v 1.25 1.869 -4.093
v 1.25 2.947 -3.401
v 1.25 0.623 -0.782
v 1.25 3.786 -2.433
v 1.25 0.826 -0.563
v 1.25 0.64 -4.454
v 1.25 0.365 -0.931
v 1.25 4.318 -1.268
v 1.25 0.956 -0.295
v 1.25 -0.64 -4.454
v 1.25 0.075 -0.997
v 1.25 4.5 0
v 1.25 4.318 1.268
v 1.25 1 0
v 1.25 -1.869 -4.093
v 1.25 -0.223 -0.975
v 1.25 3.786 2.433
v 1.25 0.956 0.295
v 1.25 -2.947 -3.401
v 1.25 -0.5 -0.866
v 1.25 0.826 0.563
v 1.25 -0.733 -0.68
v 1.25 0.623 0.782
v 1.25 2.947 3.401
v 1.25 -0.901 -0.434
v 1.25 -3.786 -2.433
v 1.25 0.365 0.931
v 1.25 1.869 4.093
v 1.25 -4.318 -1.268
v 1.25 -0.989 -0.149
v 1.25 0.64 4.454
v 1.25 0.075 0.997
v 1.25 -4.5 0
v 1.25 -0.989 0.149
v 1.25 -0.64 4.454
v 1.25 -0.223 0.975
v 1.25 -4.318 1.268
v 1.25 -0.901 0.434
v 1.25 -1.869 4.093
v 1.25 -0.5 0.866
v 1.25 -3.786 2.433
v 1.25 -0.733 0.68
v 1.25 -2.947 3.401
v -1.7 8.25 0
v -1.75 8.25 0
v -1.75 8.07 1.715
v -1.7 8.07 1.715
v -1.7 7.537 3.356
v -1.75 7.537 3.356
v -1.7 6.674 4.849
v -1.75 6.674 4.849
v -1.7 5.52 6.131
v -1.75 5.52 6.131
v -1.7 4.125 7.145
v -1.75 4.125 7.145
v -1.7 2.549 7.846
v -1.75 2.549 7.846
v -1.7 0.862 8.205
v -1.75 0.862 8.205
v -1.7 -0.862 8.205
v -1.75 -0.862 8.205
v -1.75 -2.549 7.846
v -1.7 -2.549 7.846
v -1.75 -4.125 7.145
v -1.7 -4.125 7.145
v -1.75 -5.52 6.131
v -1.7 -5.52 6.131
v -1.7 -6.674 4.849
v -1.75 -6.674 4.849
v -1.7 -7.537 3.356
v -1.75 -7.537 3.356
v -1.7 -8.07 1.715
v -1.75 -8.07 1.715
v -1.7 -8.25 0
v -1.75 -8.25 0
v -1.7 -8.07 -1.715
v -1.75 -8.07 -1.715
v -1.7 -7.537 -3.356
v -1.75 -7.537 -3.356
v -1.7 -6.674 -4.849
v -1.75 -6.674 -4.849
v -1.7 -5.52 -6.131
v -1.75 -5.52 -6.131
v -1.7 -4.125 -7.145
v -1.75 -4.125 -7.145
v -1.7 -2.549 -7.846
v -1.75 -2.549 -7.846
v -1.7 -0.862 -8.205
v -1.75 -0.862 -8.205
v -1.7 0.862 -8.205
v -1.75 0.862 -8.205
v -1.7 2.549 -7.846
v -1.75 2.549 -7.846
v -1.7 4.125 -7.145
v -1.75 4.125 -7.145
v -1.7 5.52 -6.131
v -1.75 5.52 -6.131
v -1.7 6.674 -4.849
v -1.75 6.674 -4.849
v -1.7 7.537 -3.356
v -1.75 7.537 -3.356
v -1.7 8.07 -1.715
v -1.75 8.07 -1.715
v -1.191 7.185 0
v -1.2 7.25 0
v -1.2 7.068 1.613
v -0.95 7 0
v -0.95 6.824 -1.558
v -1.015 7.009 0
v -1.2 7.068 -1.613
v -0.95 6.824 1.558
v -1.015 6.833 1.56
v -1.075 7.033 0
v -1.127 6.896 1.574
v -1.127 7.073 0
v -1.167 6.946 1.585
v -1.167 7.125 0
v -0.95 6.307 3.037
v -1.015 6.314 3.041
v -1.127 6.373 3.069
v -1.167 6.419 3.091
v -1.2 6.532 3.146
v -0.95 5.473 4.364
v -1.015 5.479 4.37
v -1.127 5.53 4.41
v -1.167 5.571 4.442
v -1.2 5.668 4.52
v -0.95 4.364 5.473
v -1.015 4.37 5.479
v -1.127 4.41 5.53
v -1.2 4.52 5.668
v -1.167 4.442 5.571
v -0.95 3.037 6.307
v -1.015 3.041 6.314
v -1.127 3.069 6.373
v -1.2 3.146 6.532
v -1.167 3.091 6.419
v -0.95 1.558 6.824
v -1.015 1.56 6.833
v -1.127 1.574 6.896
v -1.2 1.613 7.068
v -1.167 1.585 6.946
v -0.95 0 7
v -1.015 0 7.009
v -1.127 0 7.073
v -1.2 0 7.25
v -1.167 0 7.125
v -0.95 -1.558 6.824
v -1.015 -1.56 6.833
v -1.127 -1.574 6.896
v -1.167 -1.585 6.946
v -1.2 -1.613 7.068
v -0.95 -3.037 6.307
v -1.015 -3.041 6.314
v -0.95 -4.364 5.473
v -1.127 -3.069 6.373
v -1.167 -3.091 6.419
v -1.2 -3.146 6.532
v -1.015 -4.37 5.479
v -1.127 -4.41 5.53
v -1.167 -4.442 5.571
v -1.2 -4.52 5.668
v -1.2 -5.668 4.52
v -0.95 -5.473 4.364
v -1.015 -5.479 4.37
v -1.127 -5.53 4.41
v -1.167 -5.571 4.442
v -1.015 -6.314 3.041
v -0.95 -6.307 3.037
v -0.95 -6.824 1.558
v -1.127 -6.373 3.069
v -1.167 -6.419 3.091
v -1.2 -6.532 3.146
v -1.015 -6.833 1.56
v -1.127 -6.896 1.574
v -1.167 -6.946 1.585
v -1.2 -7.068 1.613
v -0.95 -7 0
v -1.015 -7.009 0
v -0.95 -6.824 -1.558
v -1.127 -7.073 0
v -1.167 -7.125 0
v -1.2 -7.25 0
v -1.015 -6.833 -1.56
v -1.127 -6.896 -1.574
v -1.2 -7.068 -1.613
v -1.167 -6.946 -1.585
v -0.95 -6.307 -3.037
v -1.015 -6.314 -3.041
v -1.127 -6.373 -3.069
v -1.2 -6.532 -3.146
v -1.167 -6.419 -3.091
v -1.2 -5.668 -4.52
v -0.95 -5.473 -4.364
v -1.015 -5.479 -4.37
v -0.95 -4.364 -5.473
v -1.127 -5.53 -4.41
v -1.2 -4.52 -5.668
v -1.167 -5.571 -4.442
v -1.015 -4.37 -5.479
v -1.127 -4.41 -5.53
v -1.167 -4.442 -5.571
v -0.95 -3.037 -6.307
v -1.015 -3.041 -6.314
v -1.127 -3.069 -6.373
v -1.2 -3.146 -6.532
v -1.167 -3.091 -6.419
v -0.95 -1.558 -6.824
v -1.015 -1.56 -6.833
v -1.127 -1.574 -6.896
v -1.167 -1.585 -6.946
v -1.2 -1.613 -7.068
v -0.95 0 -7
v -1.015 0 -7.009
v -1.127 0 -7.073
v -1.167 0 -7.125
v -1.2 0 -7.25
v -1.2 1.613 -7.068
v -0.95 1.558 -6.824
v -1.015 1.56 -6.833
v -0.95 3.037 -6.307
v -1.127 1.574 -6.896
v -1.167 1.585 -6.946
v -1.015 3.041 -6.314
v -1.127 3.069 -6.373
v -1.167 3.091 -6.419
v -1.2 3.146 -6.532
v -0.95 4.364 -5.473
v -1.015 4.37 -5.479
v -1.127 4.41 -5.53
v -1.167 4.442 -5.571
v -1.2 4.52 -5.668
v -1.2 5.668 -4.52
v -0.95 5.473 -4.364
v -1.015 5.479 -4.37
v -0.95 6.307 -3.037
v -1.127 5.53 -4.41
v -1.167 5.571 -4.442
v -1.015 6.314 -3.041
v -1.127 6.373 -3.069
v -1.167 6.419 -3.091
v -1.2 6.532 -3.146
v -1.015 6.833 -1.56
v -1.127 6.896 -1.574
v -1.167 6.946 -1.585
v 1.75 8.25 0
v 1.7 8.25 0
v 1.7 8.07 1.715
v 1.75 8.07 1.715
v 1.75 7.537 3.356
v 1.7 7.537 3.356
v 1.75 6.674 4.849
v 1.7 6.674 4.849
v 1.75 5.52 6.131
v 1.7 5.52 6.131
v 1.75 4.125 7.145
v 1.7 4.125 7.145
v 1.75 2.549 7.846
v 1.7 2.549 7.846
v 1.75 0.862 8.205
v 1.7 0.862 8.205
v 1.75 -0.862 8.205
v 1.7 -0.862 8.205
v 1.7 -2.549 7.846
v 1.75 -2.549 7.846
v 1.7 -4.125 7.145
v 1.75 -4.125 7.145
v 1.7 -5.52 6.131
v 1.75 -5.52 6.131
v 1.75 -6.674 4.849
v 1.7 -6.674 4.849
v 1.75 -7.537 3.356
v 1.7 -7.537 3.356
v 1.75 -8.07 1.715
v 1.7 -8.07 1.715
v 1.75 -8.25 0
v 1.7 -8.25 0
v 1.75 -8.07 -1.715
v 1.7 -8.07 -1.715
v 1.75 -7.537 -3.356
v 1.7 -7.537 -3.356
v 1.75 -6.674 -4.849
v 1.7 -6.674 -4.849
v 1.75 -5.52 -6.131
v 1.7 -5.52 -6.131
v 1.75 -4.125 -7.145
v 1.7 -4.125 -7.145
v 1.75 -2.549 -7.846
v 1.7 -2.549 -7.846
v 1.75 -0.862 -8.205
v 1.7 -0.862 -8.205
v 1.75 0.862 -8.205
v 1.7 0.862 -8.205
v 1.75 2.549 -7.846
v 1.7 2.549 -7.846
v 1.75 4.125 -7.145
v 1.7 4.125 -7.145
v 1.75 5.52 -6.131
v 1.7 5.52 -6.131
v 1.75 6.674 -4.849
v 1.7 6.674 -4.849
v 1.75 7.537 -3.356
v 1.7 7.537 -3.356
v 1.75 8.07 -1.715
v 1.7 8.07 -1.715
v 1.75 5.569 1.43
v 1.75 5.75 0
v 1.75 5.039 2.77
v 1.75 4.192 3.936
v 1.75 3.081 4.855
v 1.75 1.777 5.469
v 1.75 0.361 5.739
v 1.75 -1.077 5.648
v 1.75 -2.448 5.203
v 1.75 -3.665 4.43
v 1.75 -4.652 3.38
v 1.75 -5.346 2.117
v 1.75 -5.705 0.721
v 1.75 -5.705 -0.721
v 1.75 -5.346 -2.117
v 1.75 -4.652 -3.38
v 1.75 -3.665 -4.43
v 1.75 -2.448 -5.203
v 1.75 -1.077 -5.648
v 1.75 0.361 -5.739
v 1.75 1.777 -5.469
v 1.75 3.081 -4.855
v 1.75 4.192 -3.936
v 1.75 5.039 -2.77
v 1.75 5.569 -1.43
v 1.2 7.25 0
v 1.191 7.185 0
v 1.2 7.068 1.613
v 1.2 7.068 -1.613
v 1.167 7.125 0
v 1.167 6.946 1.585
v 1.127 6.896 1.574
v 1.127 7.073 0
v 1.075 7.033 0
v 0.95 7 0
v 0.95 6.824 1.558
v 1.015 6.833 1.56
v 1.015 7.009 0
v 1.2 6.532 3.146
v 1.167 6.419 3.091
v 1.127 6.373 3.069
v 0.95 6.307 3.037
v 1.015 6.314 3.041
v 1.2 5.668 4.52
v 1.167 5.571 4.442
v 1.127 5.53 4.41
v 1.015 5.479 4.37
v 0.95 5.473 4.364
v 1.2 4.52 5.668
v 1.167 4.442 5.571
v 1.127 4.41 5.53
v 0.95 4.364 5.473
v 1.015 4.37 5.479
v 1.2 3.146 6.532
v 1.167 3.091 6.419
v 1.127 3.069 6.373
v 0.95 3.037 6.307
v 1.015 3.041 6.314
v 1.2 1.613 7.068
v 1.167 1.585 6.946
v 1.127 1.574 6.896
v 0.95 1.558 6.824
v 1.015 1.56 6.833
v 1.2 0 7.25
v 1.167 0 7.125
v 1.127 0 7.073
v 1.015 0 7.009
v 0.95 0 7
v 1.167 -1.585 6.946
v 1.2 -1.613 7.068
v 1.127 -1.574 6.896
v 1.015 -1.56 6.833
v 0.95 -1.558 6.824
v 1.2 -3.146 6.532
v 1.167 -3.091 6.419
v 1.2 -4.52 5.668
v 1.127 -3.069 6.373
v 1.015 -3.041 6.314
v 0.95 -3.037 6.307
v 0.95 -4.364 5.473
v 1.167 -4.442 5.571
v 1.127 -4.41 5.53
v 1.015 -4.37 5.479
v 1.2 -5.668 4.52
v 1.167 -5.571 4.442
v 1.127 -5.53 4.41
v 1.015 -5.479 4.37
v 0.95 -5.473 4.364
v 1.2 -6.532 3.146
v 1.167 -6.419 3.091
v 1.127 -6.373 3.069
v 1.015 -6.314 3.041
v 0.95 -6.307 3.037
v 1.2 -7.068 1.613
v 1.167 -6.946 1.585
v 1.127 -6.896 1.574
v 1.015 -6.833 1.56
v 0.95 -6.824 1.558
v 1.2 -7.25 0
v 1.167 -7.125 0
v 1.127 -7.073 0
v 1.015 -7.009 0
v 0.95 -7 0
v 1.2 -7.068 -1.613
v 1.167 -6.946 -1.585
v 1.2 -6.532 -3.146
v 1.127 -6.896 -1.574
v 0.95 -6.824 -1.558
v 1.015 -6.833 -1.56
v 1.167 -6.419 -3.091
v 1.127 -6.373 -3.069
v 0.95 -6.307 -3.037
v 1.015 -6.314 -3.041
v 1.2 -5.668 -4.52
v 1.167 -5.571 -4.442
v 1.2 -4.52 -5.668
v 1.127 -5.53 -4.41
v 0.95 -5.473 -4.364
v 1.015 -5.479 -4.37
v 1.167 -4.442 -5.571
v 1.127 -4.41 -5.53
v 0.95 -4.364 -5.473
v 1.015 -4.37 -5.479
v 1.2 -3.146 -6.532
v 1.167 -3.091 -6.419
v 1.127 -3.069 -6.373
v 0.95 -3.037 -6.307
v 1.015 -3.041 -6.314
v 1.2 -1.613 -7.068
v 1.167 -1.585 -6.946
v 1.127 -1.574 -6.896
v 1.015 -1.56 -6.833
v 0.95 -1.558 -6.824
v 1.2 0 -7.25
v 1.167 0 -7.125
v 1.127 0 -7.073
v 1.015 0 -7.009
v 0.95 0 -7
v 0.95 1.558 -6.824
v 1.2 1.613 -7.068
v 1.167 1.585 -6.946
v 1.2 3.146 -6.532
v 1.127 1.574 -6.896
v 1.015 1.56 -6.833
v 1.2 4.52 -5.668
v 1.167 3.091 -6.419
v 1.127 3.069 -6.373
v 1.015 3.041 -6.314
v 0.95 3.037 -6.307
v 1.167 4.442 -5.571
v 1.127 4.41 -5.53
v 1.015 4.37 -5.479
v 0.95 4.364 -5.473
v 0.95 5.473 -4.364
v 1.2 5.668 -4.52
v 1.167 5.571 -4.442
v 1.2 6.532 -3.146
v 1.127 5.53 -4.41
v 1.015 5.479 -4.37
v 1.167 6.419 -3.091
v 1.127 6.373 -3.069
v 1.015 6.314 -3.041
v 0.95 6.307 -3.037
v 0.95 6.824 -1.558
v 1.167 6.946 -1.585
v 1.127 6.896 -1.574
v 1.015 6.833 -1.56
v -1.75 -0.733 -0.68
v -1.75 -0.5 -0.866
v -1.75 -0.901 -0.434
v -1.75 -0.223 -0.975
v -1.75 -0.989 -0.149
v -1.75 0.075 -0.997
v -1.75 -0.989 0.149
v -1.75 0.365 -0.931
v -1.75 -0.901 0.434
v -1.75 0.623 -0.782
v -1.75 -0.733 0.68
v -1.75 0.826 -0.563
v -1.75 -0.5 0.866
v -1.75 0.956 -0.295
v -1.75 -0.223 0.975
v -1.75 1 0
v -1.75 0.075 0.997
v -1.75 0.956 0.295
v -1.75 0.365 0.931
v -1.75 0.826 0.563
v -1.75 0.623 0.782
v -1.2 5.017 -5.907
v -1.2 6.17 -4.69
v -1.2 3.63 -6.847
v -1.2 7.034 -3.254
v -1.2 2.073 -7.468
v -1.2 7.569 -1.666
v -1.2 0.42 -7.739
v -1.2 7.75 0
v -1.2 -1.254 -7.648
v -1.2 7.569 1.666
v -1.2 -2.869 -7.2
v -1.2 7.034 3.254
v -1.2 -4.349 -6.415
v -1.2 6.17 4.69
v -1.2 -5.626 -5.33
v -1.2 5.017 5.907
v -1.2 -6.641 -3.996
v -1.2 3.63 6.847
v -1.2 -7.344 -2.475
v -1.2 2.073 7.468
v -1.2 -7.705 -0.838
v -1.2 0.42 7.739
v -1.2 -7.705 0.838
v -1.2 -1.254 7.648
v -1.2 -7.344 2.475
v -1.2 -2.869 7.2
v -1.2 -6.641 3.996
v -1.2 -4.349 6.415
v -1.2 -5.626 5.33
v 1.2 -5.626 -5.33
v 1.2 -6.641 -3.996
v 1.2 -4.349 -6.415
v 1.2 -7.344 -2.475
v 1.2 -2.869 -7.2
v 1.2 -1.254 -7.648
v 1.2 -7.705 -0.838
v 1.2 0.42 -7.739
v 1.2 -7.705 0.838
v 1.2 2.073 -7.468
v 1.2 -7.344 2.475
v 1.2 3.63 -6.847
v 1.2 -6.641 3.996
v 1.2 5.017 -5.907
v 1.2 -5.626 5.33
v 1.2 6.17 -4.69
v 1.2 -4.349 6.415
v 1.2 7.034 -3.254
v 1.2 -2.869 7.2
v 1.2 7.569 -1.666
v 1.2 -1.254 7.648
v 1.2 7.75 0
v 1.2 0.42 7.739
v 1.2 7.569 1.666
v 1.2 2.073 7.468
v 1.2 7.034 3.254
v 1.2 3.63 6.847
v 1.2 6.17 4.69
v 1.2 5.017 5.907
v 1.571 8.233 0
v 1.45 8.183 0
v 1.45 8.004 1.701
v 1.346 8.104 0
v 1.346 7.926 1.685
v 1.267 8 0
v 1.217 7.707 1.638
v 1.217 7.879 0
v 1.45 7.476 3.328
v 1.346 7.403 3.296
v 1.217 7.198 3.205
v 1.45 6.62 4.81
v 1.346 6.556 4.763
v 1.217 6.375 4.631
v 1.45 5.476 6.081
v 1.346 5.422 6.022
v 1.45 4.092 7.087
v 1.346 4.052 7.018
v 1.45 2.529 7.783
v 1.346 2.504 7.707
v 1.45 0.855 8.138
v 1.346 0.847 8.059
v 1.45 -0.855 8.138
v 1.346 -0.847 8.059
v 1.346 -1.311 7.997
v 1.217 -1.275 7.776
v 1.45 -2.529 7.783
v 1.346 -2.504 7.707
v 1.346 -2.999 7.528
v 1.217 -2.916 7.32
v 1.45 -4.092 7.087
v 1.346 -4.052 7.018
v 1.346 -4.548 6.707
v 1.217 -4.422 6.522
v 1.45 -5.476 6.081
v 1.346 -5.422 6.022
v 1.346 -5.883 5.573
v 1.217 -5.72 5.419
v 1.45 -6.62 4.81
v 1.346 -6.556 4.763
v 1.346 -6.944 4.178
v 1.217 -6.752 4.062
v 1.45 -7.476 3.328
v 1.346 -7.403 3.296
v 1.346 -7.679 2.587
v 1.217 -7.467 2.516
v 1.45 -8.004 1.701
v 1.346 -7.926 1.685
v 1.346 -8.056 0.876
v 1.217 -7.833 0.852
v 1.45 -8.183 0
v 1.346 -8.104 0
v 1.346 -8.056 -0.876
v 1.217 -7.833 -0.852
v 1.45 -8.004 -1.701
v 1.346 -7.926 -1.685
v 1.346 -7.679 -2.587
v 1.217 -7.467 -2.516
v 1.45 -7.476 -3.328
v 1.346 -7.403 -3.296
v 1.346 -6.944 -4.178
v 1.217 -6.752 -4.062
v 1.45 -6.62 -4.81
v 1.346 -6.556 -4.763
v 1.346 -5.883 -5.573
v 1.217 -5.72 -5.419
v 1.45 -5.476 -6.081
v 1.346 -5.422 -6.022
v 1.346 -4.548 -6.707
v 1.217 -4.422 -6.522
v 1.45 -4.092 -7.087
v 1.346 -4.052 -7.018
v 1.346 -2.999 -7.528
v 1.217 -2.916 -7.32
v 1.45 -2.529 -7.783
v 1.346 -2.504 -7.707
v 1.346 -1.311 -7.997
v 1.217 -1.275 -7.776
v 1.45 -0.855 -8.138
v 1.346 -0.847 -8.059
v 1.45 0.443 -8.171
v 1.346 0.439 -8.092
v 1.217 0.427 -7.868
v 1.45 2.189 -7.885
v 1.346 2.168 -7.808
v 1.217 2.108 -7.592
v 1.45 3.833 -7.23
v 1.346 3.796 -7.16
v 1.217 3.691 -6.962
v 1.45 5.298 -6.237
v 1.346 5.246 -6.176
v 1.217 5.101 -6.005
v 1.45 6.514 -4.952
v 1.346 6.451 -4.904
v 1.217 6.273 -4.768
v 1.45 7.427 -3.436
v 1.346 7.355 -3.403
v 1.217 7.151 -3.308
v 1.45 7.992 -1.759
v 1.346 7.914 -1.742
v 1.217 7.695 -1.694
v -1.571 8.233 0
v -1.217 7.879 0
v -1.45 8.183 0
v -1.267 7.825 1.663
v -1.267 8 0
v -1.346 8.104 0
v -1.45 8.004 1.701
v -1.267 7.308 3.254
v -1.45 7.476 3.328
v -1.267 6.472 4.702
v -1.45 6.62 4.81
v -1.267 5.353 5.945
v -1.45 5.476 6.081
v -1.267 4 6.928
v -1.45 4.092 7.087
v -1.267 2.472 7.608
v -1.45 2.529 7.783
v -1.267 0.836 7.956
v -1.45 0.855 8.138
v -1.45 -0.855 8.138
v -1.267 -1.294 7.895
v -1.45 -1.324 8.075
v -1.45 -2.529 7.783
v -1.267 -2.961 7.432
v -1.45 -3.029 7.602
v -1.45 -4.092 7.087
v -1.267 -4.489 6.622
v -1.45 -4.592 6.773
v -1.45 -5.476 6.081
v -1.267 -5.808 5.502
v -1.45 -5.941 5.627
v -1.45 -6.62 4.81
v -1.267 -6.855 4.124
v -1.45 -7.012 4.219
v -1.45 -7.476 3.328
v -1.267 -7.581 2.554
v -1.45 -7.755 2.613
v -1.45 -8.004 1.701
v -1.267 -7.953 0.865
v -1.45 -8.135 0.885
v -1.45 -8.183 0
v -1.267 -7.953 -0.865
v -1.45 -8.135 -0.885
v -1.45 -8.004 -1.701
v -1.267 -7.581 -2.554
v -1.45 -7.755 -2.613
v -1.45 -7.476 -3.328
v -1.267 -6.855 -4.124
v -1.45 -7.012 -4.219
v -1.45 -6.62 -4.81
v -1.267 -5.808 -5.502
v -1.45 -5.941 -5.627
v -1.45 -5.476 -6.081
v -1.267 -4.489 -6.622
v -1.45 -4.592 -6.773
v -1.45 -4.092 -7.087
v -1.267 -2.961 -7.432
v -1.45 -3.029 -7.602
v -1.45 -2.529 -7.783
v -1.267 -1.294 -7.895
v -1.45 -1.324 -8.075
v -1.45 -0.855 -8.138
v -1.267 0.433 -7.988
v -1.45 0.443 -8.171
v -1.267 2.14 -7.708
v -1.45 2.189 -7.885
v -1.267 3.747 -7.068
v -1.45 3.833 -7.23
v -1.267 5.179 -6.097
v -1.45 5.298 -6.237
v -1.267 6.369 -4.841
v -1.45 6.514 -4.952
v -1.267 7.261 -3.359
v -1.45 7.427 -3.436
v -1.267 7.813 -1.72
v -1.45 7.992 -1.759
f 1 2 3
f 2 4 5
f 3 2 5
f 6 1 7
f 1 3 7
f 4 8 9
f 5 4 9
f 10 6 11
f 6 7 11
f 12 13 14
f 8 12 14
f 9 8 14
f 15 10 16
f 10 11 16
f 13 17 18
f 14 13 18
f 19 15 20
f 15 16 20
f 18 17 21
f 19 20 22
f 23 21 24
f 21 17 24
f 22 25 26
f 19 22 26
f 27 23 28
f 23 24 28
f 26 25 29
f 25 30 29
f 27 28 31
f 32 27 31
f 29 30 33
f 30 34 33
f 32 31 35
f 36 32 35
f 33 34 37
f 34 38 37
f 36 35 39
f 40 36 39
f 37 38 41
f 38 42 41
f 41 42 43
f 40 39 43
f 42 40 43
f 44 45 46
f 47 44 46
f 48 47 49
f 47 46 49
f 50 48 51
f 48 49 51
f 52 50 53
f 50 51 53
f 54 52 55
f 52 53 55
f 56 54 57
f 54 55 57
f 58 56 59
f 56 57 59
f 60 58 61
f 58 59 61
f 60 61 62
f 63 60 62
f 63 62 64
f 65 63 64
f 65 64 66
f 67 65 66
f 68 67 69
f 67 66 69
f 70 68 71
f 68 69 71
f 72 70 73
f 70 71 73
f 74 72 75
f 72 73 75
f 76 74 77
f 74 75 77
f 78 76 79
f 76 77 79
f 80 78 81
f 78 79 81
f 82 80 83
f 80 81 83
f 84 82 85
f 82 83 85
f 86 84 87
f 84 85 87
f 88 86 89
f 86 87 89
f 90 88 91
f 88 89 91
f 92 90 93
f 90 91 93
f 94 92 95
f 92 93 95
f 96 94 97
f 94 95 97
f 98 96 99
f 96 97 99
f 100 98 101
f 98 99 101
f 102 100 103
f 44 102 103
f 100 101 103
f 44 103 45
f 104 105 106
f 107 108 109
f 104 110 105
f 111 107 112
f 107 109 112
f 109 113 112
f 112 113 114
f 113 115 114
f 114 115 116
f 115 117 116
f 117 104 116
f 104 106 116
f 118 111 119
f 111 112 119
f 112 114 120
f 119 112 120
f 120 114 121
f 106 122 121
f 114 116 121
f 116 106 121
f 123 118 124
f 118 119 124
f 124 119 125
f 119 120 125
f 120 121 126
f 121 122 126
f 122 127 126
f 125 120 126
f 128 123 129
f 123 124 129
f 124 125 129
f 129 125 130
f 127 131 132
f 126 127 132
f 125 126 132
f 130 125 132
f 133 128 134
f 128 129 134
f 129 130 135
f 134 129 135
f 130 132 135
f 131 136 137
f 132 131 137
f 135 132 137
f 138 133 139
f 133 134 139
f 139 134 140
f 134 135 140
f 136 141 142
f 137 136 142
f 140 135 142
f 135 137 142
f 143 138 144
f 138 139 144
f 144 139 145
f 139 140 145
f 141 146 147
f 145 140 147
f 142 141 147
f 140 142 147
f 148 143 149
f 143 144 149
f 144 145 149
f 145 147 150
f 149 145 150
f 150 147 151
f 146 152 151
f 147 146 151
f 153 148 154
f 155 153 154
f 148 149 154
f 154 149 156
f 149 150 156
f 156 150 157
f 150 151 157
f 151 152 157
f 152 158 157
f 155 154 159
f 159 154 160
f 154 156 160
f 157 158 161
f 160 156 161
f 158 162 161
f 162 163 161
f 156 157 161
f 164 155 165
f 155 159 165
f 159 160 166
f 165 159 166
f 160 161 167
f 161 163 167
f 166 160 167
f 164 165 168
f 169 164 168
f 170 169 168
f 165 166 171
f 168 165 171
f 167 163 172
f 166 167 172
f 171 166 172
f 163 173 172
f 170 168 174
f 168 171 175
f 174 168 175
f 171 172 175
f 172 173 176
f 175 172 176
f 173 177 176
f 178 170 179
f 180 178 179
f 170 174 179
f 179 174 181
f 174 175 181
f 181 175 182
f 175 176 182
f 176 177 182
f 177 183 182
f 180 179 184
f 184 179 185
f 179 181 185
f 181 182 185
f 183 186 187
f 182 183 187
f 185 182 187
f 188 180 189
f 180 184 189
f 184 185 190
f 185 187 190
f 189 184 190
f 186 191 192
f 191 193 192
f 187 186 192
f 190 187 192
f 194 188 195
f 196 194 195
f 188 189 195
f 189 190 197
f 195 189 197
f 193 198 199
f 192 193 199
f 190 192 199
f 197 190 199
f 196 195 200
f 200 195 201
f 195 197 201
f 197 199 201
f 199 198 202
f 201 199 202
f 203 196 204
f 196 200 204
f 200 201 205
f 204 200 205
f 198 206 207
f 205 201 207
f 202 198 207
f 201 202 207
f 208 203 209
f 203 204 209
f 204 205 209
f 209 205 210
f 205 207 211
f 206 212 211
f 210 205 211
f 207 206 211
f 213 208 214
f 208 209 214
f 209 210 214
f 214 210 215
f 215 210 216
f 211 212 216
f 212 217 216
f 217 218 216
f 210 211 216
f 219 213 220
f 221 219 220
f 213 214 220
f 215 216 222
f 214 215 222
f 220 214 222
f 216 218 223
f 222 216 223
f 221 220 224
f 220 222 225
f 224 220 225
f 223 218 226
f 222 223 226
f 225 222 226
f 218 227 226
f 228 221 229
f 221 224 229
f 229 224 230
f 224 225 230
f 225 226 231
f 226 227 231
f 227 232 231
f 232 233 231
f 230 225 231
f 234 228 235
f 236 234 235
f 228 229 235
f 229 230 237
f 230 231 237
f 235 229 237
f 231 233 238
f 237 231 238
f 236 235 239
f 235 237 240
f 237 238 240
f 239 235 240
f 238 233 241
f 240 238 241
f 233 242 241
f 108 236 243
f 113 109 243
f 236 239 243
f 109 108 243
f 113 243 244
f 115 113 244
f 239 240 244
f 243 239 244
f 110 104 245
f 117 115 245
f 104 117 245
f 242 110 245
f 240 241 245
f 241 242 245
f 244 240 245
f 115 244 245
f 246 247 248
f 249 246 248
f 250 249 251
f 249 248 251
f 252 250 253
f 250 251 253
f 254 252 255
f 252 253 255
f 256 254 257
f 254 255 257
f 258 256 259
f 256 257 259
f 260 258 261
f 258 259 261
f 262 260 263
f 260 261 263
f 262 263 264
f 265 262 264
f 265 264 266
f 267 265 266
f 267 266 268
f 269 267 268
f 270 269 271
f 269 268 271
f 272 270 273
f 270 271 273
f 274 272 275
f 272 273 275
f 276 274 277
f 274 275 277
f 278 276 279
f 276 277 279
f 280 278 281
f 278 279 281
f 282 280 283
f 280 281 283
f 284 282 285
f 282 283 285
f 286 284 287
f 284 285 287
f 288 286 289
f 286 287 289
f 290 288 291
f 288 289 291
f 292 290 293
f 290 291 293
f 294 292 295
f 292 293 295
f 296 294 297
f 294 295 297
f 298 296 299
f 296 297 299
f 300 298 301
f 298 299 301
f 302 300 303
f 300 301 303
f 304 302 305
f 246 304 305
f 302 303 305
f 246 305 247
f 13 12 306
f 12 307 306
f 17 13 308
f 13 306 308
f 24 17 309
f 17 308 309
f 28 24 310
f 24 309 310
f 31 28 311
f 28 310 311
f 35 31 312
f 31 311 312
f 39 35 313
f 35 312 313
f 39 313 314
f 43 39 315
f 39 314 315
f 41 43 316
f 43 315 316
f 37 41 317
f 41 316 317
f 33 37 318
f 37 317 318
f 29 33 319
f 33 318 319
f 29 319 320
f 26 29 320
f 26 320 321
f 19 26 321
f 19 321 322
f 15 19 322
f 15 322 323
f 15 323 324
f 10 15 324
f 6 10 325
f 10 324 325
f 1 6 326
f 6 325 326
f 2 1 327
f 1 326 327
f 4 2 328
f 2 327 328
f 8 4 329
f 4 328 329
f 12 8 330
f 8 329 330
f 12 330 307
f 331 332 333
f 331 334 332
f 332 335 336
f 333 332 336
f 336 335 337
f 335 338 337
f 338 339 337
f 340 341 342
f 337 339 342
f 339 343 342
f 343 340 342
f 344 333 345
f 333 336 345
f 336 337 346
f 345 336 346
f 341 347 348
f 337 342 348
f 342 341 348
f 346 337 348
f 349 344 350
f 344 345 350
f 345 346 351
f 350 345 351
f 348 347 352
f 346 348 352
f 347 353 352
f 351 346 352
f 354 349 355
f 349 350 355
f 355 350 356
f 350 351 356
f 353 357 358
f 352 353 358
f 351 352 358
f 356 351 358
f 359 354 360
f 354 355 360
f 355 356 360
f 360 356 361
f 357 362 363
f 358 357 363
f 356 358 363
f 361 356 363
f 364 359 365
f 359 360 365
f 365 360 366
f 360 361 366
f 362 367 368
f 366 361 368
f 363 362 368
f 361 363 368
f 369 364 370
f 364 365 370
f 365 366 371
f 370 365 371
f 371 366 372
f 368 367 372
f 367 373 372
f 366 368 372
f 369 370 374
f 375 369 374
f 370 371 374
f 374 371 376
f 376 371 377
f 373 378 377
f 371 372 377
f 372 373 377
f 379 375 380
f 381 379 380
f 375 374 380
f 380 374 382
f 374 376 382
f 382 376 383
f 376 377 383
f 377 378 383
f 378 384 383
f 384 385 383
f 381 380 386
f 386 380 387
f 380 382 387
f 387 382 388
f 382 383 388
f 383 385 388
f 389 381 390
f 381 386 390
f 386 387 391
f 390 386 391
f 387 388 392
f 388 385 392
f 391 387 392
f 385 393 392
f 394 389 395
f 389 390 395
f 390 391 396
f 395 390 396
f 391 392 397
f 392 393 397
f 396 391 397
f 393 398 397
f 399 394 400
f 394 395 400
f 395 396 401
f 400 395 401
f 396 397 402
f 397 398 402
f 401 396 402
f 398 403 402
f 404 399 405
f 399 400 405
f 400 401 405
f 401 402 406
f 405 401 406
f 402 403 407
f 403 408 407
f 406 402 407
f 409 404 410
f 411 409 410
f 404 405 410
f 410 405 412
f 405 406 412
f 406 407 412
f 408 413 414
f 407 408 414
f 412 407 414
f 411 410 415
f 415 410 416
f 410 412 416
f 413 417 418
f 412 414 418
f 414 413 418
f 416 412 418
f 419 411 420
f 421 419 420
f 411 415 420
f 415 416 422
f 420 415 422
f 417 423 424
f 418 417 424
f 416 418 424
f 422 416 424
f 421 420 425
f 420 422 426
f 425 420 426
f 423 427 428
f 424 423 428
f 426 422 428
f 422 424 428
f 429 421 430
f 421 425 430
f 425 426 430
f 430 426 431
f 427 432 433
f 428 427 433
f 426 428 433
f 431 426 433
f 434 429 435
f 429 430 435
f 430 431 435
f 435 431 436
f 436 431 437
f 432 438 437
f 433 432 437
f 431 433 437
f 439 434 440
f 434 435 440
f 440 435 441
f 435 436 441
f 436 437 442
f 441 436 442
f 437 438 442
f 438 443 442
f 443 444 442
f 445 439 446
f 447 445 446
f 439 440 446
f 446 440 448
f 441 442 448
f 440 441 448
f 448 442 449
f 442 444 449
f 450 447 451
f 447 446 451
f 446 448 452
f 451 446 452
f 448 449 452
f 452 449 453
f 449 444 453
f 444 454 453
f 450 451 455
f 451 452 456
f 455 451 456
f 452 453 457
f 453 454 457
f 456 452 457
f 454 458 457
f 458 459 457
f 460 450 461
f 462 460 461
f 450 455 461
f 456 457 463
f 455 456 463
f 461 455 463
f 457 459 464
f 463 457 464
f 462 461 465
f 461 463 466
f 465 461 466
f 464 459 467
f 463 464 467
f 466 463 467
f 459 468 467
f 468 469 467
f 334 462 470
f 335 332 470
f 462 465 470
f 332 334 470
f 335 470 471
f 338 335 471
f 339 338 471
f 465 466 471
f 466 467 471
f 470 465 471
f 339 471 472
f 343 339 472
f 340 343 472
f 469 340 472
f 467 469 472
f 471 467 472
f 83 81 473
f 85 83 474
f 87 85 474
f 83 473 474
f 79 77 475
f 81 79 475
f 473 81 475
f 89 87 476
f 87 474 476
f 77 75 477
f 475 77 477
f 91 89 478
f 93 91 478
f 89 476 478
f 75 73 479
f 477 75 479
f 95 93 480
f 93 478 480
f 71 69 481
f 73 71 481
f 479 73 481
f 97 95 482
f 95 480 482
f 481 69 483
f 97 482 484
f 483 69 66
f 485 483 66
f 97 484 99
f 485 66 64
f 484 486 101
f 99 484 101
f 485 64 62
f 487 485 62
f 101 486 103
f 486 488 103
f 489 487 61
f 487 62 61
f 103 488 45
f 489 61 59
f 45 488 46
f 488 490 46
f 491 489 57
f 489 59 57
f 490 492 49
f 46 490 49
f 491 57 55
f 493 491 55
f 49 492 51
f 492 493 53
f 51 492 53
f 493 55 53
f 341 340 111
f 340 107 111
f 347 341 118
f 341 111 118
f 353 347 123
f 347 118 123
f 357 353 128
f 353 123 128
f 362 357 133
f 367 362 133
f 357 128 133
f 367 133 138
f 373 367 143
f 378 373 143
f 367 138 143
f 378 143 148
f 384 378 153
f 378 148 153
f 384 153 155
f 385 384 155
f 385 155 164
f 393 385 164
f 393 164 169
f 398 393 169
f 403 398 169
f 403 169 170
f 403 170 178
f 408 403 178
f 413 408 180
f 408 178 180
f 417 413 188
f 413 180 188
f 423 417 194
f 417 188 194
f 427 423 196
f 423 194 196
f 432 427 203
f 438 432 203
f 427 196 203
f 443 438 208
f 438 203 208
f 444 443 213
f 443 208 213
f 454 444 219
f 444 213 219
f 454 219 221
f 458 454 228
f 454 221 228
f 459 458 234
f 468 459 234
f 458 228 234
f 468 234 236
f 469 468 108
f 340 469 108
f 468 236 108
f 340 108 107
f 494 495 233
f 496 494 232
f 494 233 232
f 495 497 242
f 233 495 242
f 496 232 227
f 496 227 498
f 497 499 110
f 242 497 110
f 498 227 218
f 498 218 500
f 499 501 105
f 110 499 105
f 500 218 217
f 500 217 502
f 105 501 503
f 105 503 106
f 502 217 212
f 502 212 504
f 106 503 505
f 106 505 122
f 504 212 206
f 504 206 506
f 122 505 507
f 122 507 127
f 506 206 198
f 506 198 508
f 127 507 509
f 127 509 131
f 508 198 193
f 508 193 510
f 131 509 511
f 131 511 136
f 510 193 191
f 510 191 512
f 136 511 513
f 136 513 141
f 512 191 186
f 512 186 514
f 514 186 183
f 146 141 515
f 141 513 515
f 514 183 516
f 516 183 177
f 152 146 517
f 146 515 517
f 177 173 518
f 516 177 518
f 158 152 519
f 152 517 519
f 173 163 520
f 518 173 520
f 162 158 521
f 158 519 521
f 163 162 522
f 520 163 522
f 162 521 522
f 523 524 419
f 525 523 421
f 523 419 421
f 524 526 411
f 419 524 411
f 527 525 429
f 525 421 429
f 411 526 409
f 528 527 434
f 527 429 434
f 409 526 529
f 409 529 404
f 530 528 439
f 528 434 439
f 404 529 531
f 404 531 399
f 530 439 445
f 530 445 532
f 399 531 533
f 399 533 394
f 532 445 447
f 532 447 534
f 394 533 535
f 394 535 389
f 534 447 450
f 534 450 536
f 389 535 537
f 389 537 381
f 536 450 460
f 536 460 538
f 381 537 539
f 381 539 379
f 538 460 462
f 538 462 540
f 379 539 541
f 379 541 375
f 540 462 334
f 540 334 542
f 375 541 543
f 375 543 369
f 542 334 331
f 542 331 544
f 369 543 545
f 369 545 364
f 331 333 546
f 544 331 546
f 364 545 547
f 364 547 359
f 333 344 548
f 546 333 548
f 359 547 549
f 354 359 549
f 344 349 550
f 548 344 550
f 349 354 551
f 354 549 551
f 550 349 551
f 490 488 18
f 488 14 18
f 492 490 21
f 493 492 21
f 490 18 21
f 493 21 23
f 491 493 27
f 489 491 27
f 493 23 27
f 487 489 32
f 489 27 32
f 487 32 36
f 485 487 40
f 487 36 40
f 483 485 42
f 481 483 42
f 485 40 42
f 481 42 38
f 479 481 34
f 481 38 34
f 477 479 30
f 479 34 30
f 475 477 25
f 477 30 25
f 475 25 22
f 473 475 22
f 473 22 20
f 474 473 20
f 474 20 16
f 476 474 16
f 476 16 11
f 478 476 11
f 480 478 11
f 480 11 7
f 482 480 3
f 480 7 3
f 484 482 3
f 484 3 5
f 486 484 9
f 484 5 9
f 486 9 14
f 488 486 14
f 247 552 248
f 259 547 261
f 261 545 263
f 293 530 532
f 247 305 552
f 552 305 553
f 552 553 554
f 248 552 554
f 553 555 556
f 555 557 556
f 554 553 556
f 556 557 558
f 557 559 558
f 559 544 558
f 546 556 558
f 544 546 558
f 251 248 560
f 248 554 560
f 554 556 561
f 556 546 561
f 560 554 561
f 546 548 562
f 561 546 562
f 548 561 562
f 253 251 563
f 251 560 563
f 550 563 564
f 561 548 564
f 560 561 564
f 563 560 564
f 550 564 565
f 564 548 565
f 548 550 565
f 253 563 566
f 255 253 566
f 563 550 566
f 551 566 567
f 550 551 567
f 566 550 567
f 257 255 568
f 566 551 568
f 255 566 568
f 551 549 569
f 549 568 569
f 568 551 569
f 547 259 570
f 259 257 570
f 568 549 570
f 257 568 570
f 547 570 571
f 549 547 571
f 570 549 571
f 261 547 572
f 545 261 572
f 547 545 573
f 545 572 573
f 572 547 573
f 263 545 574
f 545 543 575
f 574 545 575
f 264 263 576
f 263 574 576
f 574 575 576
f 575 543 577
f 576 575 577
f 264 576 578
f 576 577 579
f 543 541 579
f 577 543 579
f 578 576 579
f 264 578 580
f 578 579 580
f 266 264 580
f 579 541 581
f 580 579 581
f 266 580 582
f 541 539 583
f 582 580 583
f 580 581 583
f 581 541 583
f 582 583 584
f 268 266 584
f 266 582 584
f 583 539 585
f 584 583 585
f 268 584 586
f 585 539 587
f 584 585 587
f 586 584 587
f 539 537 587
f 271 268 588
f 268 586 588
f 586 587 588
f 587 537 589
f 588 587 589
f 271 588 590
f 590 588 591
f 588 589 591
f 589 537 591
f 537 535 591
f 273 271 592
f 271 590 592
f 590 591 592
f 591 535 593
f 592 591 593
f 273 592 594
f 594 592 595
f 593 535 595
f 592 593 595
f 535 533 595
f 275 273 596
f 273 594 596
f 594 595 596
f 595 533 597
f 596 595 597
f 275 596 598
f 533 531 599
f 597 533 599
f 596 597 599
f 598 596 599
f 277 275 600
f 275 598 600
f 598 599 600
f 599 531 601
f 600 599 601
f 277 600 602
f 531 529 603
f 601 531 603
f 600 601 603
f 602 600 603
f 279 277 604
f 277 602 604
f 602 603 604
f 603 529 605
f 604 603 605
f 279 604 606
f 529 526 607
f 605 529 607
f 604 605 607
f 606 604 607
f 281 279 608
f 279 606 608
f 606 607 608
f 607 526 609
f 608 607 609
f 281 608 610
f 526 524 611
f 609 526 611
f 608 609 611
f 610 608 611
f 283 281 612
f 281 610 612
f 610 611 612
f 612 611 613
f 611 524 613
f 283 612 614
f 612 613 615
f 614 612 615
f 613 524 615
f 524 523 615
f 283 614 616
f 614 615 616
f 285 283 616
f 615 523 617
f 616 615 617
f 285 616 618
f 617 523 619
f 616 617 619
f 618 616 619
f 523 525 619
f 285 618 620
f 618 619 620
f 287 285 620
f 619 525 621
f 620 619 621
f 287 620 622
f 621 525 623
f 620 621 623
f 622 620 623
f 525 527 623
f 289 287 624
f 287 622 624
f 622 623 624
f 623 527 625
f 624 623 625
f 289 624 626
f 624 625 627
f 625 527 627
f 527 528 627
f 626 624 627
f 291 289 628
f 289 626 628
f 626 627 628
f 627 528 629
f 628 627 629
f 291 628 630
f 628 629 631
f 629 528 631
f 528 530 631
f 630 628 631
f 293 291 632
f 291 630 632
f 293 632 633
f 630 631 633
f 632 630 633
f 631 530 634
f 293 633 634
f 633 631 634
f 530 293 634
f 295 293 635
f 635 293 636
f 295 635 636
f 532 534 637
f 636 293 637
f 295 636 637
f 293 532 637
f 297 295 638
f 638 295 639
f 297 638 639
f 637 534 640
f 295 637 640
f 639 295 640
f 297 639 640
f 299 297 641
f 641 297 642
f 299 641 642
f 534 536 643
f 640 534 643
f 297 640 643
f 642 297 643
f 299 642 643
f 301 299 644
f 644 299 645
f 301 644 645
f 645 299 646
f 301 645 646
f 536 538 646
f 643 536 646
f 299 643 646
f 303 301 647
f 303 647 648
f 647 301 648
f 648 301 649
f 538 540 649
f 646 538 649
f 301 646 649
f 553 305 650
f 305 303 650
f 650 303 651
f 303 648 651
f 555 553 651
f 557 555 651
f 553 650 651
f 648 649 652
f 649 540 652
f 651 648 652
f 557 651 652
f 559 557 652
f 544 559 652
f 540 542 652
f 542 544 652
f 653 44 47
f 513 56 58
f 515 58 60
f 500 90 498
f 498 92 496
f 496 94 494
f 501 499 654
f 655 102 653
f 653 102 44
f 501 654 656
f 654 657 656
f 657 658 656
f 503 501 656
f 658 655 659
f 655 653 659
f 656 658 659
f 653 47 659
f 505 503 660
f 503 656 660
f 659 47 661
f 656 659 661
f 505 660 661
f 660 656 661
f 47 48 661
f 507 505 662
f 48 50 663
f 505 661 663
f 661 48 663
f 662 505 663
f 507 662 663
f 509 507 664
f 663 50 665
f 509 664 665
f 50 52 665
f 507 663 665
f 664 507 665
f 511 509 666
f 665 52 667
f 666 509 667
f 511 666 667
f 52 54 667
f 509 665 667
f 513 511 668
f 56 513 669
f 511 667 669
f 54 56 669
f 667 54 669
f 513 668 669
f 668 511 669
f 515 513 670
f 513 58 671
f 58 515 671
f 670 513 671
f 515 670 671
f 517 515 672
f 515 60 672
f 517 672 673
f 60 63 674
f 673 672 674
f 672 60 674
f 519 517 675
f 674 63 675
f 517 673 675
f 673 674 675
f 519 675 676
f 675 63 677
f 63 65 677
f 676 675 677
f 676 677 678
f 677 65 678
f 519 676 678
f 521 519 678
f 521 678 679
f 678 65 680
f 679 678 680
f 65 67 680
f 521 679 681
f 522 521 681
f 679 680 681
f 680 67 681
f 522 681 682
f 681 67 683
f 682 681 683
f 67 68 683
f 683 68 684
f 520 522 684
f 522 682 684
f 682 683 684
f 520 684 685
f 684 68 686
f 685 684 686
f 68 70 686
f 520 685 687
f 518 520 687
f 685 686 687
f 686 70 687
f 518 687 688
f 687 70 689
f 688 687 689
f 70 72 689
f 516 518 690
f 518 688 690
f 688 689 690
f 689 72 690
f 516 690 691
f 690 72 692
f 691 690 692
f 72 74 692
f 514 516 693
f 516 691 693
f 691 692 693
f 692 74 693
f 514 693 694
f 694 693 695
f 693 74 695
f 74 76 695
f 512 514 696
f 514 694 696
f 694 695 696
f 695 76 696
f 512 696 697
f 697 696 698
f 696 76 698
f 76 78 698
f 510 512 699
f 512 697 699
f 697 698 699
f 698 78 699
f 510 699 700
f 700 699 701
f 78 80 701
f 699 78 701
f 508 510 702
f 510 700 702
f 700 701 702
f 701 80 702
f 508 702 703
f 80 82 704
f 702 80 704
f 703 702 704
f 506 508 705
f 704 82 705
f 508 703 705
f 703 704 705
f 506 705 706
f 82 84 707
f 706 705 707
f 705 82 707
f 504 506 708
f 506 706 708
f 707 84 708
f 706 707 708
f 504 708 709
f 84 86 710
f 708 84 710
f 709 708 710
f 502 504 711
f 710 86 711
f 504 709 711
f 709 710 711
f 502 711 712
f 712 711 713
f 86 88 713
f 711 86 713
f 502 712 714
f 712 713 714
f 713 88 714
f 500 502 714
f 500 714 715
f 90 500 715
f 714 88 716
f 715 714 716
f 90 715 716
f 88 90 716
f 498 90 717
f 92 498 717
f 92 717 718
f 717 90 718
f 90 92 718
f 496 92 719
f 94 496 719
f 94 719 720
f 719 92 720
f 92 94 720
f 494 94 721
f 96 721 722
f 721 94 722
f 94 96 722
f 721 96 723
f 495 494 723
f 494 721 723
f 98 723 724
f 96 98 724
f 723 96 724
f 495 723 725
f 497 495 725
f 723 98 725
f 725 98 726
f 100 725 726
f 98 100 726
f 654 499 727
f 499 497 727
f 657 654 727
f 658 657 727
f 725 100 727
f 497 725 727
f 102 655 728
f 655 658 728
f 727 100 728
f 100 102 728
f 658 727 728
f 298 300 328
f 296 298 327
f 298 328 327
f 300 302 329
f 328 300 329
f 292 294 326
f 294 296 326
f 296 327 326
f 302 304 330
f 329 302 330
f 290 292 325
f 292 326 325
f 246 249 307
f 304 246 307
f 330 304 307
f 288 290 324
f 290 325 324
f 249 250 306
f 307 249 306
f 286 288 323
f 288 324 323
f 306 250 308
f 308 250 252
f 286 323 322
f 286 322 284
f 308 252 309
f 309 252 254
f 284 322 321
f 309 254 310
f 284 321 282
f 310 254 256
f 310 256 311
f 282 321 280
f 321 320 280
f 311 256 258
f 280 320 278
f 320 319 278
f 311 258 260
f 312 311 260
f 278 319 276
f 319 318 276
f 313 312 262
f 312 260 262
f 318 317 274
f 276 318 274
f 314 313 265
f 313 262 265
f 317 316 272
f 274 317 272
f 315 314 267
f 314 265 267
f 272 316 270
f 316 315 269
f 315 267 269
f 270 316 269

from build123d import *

# Parameters (mm, degrees)
FILLET1_R = 0.5


with BuildPart() as part:
    # Sketch1 → Revolve1 (revolve)
    with BuildSketch(Plane.XY):
        with BuildLine():
            Line((1.75, 8.25), (1.2, 8.25))
            Line((1.2, 8.25), (1.2, 7.25))
            ThreePointArc((1.2, 7.25), (1.126776695, 7.073223305), (0.95, 7))
            Line((0.95, 7), (-0.95, 7))
            ThreePointArc((-0.95, 7), (-1.126776695, 7.073223305), (-1.2, 7.25))
            Line((-1.2, 7.25), (-1.2, 8.25))
            Line((-1.2, 8.25), (-1.75, 8.25))
            Line((-1.75, 8.25), (-1.75, 1))
            Line((-1.75, 1), (1.25, 1))
            Line((1.25, 1), (1.25, 4.5))
            Line((1.25, 4.5), (1.75, 5.75))
            Line((1.75, 5.75), (1.75, 8.25))
        make_face()
    revolve(axis=Axis((0, 0, 0), (1, 0, 0)))

    # Fillet1
    fillet1_edges = [part.edges().sort_by_distance(p)[0] for p in [
        (1.2, -8.25, 0),
        (-1.2, -8.25, 0),
    ]]
    fillet(fillet1_edges, radius=FILLET1_R)


solid = part.part
